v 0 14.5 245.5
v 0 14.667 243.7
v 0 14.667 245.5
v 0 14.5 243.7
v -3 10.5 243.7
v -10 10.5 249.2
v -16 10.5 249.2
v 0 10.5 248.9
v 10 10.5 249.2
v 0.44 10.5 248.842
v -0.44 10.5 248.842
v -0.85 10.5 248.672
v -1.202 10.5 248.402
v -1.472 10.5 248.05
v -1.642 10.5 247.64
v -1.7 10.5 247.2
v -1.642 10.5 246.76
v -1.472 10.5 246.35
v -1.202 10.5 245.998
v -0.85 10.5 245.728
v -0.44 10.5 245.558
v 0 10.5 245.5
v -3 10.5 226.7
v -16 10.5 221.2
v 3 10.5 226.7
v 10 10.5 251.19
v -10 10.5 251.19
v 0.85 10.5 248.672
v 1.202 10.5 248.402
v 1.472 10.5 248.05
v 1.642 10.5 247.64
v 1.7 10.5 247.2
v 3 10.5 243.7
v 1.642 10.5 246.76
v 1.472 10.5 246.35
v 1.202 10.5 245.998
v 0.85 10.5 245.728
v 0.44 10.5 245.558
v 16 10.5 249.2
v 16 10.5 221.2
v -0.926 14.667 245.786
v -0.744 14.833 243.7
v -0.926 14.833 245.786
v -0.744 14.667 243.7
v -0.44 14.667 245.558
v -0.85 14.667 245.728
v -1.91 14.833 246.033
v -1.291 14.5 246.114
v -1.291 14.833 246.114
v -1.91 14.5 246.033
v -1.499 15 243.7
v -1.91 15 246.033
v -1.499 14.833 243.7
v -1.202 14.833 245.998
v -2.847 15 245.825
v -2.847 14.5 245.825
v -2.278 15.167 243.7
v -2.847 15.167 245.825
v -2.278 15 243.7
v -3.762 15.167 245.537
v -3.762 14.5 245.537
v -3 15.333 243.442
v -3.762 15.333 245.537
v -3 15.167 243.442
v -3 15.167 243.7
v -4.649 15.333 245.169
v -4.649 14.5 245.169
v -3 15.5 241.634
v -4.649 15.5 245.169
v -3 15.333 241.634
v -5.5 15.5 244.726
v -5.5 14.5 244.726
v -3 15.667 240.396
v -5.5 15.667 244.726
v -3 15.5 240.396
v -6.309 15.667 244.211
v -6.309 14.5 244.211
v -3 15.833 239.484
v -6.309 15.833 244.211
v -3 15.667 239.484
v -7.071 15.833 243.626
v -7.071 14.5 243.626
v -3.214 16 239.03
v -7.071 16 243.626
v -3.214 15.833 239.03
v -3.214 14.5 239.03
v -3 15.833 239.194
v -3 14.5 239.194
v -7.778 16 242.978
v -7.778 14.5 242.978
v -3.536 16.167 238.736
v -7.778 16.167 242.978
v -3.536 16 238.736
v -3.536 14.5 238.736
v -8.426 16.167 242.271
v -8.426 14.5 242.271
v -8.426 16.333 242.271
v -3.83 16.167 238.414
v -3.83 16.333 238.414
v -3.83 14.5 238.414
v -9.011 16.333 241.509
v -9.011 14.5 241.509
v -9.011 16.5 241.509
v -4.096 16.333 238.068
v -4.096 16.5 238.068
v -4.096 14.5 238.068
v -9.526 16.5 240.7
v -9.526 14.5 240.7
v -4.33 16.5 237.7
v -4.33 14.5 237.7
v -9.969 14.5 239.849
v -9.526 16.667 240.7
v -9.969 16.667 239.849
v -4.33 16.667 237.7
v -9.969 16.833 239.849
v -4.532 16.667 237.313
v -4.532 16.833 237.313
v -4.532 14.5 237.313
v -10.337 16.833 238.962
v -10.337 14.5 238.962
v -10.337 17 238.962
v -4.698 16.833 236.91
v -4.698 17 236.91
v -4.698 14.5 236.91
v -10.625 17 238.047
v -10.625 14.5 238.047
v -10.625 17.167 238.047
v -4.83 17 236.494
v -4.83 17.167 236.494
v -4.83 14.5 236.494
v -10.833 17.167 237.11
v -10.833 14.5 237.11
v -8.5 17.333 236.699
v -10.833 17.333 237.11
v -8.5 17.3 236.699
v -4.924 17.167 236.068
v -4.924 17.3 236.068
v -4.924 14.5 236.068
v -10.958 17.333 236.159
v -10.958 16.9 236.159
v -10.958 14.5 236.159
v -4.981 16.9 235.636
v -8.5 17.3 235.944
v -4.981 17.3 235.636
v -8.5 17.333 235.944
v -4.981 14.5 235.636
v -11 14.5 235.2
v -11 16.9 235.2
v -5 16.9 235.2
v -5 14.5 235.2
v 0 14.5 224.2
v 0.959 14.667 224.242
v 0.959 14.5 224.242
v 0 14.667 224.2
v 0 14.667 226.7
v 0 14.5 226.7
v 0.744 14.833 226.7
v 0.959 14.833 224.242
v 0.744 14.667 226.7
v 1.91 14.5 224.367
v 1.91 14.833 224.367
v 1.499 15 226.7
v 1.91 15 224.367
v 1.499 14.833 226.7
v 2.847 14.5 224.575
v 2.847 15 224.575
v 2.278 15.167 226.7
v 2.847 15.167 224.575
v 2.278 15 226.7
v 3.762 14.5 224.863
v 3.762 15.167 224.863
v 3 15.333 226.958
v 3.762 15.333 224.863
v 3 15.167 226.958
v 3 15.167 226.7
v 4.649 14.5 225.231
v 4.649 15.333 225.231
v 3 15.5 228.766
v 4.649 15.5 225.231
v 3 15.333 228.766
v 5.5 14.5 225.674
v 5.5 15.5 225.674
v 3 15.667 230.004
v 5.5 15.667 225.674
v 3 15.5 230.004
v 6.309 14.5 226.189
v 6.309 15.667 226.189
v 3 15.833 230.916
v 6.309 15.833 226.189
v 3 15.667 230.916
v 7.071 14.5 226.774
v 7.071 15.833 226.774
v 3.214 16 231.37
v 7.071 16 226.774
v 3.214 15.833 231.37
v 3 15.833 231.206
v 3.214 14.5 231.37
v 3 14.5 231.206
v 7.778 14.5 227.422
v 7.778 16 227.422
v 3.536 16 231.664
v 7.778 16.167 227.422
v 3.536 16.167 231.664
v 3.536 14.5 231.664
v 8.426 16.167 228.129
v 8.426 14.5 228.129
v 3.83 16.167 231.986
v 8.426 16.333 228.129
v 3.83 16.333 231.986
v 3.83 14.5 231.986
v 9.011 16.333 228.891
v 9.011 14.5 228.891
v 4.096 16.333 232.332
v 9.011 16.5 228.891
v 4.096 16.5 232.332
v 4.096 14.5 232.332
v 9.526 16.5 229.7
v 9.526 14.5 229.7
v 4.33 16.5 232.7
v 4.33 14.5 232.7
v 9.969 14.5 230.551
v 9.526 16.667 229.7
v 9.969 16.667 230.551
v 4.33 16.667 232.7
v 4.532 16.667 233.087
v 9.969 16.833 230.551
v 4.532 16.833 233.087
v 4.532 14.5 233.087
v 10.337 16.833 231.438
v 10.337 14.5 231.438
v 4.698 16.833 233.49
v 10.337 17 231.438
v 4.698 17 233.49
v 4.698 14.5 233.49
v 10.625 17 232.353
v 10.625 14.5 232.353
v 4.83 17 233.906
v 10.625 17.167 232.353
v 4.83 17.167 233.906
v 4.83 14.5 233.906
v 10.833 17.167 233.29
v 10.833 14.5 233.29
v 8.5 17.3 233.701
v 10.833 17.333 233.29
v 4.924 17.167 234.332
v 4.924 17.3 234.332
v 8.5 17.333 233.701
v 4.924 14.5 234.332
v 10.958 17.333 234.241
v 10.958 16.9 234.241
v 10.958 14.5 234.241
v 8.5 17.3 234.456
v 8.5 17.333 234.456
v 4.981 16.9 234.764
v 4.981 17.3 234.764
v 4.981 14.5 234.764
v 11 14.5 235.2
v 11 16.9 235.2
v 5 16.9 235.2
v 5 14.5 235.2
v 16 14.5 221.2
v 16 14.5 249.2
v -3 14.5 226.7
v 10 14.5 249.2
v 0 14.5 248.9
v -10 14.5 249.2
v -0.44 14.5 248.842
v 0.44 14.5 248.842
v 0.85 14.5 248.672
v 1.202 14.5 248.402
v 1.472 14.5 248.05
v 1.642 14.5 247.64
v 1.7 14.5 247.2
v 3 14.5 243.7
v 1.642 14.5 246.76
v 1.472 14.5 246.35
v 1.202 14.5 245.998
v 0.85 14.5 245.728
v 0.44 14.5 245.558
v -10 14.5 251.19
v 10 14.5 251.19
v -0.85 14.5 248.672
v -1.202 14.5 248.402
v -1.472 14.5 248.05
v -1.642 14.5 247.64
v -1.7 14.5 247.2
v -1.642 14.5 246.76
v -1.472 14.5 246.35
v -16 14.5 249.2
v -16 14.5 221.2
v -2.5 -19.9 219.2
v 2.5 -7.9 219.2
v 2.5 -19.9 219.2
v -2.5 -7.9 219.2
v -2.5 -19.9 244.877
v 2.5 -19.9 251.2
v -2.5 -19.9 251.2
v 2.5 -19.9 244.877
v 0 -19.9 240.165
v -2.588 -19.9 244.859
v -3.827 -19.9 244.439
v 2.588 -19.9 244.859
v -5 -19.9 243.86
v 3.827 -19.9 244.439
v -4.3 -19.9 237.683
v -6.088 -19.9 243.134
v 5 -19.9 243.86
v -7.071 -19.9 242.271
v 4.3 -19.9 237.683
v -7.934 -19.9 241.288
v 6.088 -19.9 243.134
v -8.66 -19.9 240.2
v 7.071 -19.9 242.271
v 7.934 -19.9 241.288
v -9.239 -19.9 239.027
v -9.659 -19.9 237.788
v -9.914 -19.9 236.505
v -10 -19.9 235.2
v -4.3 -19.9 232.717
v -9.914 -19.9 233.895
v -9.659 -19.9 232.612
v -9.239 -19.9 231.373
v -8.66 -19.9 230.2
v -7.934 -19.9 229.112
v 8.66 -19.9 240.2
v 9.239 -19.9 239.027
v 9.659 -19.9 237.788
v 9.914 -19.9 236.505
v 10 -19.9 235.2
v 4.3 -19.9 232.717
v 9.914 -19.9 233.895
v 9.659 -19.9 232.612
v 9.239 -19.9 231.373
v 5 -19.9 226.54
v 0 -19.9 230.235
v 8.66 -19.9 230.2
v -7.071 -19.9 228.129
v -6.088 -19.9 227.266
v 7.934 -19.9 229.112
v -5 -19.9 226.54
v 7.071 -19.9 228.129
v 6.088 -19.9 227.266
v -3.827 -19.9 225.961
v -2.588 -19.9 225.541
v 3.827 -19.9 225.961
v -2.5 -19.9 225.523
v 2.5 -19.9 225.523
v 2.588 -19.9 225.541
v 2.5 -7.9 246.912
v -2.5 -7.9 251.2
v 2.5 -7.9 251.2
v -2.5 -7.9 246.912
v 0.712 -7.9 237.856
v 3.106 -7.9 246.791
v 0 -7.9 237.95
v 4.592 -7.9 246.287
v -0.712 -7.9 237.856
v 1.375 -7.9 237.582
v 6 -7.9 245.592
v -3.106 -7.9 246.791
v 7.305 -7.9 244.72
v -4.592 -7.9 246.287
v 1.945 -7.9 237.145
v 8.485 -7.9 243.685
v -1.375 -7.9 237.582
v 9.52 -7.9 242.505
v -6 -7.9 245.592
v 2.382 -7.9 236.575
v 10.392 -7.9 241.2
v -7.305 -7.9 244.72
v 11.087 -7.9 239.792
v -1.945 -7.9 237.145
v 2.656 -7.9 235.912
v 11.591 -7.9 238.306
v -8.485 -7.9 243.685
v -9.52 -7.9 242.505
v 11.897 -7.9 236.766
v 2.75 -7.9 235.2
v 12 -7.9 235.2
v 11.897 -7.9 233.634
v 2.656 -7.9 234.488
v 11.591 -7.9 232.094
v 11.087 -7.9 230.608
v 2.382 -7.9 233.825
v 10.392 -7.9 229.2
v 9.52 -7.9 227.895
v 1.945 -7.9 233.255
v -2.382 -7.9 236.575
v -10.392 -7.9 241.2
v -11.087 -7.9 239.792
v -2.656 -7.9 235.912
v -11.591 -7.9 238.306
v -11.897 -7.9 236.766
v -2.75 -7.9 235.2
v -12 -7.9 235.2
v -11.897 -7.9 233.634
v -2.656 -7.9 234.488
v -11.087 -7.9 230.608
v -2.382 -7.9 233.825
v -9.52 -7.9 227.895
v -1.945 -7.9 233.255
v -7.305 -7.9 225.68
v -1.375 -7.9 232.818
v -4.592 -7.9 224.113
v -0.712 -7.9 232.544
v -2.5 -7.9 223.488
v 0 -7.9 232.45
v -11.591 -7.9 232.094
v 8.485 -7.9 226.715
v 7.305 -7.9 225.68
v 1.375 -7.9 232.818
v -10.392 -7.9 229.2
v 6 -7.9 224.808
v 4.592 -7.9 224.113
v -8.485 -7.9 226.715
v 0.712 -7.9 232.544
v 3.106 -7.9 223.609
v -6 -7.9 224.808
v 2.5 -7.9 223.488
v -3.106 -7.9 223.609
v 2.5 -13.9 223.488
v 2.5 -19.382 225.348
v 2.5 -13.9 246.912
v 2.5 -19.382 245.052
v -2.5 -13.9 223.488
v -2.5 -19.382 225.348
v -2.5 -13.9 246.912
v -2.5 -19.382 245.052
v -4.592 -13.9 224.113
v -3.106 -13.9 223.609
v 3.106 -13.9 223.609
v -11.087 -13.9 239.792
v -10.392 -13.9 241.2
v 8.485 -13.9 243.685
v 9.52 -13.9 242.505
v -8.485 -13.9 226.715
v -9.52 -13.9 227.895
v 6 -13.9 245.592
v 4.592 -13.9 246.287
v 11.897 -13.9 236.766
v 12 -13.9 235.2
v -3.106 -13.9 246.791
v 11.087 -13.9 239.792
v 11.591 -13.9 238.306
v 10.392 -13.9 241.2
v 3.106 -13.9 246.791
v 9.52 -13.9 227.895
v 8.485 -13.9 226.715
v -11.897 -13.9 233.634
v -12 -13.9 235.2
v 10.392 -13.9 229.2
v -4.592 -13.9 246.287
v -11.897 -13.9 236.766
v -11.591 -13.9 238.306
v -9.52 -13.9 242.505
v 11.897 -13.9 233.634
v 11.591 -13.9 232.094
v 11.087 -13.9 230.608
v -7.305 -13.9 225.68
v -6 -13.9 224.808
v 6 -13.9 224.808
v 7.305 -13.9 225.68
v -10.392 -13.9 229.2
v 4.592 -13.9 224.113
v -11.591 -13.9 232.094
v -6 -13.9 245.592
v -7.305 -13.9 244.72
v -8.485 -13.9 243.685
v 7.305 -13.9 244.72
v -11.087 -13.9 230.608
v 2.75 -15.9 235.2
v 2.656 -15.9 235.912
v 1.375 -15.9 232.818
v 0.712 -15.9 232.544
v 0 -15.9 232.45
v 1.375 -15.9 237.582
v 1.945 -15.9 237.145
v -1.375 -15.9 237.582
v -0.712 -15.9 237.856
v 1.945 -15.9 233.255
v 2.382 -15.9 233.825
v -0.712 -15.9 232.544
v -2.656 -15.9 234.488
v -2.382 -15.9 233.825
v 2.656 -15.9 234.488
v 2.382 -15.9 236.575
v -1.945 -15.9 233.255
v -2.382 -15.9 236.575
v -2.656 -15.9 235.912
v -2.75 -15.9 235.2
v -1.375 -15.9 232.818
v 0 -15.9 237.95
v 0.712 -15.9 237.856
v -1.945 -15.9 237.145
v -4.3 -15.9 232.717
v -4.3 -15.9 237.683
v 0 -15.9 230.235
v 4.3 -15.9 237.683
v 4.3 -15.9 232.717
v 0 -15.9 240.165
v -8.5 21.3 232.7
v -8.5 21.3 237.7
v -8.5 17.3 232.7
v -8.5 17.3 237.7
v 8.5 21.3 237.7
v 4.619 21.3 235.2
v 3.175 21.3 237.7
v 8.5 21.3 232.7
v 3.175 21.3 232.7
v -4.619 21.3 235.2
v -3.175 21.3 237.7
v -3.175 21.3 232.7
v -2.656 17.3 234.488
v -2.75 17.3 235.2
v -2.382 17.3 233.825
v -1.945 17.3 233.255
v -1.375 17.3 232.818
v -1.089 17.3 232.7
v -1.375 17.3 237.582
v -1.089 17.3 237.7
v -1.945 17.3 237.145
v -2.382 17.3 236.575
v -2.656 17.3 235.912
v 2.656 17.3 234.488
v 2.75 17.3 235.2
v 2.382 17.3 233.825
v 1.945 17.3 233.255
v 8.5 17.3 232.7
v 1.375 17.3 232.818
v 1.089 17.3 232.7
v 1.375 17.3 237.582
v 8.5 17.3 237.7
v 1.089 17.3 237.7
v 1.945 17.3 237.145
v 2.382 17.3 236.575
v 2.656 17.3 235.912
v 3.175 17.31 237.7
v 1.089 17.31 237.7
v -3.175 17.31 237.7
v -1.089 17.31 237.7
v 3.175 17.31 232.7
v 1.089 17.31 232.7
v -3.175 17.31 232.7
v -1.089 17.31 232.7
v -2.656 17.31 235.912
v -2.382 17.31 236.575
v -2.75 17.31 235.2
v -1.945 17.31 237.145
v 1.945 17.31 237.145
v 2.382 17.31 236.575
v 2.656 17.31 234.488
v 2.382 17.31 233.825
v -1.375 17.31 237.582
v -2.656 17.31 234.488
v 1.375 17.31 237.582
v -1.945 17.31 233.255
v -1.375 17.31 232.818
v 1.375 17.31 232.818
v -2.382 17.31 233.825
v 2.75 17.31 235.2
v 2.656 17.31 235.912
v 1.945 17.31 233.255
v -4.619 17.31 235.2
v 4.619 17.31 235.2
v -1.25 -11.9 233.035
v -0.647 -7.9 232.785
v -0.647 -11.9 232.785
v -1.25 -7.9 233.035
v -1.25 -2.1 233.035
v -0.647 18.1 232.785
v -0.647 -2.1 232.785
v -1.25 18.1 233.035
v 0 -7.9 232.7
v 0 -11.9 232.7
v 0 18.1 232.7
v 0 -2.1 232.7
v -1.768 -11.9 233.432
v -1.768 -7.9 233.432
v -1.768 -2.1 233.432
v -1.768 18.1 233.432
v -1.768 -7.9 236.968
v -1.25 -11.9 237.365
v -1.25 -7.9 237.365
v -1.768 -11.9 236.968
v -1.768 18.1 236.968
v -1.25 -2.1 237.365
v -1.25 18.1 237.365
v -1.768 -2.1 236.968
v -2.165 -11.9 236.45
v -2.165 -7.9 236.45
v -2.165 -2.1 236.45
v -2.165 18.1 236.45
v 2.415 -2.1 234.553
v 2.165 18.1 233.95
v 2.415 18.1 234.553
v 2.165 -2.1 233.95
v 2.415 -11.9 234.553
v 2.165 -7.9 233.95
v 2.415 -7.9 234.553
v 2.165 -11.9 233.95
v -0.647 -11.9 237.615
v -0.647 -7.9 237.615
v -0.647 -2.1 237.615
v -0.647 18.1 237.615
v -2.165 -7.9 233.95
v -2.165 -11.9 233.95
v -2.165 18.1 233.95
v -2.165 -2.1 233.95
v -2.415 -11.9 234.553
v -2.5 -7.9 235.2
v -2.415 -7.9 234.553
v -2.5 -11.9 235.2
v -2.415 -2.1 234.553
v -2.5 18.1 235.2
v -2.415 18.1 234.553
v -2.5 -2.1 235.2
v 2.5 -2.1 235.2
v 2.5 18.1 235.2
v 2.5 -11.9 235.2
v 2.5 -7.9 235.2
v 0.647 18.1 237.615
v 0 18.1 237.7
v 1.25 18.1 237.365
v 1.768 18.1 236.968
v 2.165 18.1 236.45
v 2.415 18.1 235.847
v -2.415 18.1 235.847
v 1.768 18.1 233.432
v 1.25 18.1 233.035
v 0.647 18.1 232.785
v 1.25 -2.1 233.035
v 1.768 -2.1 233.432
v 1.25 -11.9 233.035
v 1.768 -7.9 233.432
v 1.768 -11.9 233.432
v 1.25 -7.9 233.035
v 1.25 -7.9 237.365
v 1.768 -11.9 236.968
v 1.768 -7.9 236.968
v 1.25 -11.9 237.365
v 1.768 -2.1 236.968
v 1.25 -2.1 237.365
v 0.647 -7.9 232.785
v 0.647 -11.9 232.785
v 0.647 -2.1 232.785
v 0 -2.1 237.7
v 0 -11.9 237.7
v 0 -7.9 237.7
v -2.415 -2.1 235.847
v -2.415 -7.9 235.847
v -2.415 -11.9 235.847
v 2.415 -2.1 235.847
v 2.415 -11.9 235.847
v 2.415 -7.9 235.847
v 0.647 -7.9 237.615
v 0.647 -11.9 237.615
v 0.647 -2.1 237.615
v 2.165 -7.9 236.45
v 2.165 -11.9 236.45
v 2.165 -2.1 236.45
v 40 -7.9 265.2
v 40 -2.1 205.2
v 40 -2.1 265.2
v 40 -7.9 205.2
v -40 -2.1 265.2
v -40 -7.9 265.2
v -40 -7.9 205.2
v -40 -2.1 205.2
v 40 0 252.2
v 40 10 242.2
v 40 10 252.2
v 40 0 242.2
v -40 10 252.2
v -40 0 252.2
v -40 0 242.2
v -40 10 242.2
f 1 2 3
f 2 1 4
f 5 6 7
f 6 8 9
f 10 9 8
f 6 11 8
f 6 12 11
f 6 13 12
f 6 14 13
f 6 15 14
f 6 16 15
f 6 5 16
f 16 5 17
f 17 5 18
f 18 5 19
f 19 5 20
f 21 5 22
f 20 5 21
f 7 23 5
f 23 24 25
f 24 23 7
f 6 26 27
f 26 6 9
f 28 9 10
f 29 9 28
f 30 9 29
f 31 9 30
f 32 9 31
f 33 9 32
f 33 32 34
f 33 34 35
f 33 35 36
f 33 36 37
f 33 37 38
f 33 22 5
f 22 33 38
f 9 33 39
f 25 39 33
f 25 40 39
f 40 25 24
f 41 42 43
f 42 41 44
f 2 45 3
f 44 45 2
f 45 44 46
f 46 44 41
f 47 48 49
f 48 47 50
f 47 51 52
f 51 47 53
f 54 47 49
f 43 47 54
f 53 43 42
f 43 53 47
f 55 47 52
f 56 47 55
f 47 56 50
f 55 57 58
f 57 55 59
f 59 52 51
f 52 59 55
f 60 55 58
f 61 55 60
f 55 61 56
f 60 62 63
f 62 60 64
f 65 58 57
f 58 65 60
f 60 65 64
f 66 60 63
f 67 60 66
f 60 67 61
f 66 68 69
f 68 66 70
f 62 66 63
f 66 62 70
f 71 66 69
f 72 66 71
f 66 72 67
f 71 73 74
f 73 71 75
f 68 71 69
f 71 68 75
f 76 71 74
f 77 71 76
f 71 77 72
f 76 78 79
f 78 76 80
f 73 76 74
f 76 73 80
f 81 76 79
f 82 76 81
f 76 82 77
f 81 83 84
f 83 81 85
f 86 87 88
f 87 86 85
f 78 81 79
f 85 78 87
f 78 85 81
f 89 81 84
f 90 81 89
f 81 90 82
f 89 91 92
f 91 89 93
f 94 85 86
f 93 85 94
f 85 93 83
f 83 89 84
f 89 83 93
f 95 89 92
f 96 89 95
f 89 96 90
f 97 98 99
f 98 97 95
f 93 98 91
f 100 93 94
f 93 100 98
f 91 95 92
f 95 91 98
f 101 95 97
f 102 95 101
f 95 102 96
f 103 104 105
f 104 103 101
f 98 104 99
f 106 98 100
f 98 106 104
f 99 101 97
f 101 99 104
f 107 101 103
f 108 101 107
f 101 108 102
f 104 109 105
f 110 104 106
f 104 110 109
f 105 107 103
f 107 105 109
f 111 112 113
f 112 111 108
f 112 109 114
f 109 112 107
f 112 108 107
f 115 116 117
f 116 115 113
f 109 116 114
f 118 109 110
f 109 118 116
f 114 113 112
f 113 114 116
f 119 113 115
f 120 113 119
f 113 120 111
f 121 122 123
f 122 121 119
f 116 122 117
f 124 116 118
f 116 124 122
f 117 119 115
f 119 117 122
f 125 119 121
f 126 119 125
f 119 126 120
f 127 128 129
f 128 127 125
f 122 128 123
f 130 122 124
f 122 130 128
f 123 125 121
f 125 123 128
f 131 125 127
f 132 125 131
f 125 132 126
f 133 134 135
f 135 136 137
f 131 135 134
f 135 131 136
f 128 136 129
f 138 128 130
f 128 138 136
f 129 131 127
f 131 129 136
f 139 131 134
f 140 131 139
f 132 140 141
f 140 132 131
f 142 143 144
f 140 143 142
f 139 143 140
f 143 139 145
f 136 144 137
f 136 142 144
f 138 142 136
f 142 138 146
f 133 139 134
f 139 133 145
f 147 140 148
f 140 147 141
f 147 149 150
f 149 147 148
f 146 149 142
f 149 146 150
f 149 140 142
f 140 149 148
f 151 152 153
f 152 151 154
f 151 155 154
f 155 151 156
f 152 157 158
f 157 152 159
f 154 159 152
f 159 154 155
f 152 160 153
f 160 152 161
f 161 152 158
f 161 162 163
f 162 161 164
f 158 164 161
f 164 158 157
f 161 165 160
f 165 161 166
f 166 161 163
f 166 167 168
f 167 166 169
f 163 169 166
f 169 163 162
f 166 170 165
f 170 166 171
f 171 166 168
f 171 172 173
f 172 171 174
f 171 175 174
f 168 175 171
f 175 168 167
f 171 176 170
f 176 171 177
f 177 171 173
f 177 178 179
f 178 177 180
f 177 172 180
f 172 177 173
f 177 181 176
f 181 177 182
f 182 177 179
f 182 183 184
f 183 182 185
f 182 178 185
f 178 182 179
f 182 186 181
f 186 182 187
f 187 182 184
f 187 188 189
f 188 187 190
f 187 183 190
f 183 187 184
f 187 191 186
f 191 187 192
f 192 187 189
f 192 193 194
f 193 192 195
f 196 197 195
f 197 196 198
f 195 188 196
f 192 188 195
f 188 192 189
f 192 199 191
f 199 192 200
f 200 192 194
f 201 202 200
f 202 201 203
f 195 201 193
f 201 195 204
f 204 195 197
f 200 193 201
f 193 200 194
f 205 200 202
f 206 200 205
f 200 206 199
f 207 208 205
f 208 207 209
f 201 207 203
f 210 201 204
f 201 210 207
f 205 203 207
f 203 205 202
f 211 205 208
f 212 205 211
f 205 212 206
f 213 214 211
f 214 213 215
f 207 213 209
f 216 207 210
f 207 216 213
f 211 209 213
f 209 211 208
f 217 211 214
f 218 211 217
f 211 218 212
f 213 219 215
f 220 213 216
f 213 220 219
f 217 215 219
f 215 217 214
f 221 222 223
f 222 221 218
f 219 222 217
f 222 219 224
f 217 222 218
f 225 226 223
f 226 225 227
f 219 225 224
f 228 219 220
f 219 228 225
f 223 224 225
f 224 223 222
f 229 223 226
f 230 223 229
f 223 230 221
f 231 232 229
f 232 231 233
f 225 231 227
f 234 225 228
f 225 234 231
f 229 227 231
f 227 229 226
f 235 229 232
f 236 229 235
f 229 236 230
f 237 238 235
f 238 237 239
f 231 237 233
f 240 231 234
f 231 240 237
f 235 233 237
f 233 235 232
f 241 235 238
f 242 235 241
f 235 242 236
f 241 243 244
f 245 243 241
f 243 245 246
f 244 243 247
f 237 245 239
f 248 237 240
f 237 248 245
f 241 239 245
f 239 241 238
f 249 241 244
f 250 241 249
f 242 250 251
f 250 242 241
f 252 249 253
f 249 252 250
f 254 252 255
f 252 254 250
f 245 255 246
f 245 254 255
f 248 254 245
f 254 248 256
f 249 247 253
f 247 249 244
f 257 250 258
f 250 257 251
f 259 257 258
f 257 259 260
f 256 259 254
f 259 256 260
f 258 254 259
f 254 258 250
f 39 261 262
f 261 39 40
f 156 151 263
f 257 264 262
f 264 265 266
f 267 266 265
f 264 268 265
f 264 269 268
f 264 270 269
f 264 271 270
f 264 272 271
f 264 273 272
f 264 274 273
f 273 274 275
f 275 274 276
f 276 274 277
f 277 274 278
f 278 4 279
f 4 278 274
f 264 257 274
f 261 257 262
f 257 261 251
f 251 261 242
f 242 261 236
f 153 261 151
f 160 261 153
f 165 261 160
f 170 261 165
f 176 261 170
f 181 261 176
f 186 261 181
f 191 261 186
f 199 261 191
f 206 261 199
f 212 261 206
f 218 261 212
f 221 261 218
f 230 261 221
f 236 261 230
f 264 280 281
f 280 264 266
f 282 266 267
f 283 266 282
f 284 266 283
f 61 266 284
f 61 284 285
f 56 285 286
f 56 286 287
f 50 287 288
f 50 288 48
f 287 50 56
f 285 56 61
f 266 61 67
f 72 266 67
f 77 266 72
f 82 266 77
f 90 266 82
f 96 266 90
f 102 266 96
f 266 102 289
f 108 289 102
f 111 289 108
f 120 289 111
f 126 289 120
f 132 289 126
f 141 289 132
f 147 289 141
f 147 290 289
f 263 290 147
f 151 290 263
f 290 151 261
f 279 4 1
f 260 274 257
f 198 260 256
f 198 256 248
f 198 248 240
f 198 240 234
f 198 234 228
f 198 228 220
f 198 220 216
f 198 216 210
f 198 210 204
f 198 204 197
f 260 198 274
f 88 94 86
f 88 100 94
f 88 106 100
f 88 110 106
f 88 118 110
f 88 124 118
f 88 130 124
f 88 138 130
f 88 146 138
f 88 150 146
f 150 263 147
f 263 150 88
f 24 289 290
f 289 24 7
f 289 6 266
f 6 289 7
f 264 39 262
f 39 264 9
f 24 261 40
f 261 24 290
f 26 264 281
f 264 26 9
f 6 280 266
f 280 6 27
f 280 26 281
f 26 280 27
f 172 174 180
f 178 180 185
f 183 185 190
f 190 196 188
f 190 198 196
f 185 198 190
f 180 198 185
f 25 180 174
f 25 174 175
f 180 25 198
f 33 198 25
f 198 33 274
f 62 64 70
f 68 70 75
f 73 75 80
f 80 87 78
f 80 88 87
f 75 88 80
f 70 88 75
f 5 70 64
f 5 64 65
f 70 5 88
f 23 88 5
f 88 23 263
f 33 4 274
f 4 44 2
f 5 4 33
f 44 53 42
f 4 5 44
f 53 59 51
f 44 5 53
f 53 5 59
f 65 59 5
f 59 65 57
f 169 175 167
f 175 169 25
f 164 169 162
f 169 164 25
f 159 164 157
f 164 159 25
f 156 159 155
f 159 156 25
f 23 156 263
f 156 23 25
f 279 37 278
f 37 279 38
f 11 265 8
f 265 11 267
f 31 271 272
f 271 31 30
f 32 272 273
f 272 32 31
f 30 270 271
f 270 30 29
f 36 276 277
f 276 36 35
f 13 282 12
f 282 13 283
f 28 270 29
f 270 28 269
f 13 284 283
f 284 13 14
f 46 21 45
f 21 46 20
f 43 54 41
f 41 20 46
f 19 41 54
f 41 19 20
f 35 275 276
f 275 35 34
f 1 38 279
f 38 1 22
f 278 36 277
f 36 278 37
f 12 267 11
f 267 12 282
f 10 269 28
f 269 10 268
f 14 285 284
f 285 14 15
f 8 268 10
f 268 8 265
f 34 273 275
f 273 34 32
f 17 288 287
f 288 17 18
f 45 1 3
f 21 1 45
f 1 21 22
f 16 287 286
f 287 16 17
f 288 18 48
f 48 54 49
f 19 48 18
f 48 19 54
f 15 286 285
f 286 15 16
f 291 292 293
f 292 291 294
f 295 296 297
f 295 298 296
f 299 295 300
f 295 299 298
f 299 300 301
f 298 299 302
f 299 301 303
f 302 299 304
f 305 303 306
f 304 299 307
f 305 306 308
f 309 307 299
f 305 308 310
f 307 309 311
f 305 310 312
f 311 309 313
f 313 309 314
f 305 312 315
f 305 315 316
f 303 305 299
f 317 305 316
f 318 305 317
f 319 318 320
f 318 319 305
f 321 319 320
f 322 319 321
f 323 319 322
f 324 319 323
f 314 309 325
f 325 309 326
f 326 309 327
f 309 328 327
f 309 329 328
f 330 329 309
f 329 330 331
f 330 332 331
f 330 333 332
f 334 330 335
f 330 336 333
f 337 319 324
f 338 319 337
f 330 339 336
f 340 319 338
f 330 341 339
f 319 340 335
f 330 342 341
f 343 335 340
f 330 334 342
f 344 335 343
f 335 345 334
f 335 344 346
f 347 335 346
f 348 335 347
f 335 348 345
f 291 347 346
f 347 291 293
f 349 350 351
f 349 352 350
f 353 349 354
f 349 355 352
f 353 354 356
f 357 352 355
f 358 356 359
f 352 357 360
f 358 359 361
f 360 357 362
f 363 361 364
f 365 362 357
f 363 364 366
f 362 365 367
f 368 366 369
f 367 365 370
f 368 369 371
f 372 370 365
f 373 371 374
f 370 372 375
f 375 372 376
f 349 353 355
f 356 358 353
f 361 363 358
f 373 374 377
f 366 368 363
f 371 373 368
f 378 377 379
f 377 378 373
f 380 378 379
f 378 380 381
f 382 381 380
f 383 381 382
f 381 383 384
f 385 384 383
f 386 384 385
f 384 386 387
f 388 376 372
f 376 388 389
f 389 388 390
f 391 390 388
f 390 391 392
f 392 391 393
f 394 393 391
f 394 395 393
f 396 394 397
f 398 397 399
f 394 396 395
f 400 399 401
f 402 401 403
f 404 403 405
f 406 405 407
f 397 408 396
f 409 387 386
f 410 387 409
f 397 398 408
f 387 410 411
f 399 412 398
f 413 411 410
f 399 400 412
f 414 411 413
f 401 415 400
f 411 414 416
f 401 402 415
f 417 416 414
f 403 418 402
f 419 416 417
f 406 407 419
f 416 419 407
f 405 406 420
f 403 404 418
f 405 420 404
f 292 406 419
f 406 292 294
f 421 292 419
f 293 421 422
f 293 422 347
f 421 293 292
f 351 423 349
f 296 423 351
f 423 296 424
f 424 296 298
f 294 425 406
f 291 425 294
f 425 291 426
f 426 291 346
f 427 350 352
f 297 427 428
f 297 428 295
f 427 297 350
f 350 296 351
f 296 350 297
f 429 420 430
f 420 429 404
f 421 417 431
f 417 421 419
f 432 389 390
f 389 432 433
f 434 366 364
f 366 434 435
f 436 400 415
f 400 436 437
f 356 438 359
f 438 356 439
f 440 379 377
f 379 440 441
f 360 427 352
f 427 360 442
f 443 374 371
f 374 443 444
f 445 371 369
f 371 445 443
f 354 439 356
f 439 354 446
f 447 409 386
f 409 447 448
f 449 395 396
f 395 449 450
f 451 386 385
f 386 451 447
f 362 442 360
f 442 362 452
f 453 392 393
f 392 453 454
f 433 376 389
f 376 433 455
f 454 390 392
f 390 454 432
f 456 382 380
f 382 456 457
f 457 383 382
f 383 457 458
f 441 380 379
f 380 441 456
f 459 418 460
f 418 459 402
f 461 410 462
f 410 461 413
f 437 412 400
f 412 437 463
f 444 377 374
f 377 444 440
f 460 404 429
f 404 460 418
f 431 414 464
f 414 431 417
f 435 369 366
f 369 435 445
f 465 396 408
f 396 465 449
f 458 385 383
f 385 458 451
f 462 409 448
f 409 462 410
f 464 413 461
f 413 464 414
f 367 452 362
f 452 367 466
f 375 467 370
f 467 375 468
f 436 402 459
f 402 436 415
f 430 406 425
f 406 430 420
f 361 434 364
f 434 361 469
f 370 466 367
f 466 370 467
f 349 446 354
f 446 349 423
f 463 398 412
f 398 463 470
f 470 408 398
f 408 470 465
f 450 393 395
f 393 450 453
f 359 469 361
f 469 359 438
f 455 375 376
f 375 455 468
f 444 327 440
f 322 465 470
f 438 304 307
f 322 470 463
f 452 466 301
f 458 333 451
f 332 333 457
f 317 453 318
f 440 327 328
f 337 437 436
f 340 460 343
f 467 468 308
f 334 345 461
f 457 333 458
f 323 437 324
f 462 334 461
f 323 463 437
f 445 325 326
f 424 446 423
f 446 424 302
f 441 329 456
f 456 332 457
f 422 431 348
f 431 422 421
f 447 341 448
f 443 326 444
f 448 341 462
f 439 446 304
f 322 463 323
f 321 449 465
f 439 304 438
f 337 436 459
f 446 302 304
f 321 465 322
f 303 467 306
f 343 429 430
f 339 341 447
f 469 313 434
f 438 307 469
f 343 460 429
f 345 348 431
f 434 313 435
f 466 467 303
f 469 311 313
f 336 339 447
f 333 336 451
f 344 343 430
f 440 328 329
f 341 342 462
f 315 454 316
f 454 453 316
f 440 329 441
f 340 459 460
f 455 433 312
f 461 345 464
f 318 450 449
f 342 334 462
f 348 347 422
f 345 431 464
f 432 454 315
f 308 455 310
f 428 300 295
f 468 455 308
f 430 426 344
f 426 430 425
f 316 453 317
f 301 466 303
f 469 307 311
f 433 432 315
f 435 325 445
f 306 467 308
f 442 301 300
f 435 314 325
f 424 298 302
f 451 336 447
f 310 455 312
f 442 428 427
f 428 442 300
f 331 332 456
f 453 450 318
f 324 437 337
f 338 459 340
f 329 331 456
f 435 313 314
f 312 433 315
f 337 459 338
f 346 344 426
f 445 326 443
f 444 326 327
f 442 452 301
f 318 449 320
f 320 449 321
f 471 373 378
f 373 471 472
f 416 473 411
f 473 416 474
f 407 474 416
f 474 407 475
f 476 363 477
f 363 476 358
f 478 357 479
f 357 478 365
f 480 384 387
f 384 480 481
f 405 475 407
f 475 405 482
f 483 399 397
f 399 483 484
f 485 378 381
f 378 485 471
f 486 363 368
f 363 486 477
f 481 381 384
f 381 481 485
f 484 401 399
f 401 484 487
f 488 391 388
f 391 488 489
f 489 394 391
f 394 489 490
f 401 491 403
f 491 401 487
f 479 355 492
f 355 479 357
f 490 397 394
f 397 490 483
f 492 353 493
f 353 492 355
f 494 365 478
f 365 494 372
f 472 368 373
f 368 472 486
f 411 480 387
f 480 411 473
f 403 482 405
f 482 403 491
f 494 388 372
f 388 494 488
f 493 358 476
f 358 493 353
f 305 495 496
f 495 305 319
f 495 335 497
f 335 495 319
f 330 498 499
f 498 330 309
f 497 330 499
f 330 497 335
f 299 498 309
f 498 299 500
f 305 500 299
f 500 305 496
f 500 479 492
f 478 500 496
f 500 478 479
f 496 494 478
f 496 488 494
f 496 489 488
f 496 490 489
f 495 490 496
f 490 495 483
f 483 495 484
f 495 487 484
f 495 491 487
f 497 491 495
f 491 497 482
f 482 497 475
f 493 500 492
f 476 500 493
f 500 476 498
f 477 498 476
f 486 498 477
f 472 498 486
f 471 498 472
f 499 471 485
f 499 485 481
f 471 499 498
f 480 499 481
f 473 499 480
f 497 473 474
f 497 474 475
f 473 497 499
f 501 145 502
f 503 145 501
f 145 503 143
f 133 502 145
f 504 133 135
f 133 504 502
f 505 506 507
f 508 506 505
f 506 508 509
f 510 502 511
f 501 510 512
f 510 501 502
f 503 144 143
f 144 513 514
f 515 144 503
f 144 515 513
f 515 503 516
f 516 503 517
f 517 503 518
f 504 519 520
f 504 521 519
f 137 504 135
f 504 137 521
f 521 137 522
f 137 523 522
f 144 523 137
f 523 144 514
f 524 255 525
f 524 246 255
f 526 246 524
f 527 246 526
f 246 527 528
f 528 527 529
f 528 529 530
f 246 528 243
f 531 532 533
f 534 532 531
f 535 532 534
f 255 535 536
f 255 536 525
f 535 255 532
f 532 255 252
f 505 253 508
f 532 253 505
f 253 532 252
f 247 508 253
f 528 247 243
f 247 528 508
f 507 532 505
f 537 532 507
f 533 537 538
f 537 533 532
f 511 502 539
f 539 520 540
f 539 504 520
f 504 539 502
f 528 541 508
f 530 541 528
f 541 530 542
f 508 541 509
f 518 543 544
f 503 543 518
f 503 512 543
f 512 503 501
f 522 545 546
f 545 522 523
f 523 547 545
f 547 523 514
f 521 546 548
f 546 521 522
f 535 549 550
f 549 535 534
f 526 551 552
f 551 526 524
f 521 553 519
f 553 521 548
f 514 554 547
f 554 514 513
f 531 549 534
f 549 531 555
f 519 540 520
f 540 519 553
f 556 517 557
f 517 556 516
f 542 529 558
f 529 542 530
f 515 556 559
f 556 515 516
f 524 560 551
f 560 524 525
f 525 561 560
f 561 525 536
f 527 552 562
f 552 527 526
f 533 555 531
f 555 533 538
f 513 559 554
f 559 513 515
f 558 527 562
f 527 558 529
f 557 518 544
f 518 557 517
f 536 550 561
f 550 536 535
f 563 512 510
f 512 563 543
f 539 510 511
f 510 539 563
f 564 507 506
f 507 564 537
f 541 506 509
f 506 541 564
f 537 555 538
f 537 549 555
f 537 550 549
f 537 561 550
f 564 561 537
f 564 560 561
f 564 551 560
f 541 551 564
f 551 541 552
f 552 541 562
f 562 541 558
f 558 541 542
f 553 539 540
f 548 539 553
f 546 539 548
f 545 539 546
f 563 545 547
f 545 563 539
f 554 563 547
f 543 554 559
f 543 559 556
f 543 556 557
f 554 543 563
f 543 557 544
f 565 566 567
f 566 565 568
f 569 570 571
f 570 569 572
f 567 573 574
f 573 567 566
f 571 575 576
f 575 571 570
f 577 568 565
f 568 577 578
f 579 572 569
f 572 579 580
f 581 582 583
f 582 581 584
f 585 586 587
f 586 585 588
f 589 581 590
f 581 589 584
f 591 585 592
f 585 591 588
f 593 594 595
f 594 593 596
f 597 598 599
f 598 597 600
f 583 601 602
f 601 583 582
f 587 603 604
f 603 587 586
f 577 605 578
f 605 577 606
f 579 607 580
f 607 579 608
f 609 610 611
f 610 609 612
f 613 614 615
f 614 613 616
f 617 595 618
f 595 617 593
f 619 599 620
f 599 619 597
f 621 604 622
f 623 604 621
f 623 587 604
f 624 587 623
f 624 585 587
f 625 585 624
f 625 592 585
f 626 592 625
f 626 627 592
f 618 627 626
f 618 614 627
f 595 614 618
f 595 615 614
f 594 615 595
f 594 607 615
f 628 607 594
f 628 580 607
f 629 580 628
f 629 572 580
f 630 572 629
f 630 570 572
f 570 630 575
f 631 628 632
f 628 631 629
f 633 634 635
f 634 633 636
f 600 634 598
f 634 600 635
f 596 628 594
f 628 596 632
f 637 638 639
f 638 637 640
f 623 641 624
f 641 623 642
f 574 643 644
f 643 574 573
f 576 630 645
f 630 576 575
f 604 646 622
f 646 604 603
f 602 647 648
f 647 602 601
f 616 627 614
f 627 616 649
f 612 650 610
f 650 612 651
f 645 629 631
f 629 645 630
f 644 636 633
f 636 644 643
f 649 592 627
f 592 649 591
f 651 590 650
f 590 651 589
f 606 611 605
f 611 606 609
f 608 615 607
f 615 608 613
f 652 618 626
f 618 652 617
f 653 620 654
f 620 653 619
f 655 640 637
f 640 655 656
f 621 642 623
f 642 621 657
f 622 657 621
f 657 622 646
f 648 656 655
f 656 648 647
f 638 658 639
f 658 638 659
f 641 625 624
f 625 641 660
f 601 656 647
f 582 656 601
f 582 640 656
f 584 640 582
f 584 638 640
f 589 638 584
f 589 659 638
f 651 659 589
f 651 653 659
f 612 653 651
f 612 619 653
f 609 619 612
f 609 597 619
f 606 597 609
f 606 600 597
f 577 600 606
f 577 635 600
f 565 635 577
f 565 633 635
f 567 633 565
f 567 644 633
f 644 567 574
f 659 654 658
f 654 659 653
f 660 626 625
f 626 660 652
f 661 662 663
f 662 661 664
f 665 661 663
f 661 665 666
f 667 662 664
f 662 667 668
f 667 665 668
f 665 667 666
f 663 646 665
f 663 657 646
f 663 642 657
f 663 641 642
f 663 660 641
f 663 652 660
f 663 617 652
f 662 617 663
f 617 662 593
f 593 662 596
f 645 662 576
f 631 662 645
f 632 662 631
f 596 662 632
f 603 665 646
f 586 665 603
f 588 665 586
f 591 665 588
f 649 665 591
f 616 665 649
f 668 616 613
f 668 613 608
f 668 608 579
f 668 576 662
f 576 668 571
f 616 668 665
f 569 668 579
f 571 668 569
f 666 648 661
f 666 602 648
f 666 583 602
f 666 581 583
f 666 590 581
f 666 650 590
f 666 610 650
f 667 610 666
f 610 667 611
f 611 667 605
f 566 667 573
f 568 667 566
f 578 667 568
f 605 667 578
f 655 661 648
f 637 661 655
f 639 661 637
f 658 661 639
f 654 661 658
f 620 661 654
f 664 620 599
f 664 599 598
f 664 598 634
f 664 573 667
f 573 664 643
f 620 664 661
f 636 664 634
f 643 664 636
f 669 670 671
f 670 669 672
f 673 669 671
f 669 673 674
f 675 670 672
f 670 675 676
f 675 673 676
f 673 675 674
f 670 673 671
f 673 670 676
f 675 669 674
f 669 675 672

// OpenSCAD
// 2026-11-03: quarter-turn door latch on an M5 bolt (concept, 2 per door, top edge).
// An M5 bolt turns freely in a 5.5 mm hole in the door. Outside: a printed knob on the bolt
// head. Inside: a printed T-bar on the bolt's tip (captive M5 nut, its position on the
// thread sets the squeeze). A printed receiver hangs from the back slot of the shell's top
// 1010 member: the bar passes through its slot with the knob vertical, and a quarter turn
// carries it up two helical ramps (ramp_rise over 90 deg) on the receiver's back face,
// pulling the door in; a shallow notch at the end of each ramp holds it locked.
// part = "assembly" | "knob" | "bar" | "receiver"; turn = 0 (open) .. 90 (locked).
// Axes as the box: y = 0 the shell front face, door inner face at y = -foam, z up. Units mm.

part = "assembly";
turn = 90;

t = 5.8; ext = 10; foam = 2.1;
mem_z   = [258 - t - ext, 258 - t];      // top frame member, 242.2 .. 252.2
bolt_z  = mem_z[0] - 7;                  // bolt axis, 7 below the opening's top edge
door_y  = -foam;

// receiver
rc_front = 10.5;  rc_t = 4;              // plate y = 10.5 .. 14.5, just behind the member
slot     = [6, 17];                      // across, along the bar (the bar enters vertical)
ramp_r   = [5, 11];                      // ramp annulus radii
ramp_rise = 3;                           // pull-in over the quarter turn
notch    = 0.6;

// bar
bar      = [17, 5, 4];                   // length, width, thickness (along y)
bar_y0   = rc_front + rc_t + ramp_rise - 0.2;   // bar front face when locked
nut_af = 8; nut_h = 4;

// ---------- parts ----------
module knob() {
    difference() {
        union() {
            cylinder(d = 24, h = 6, $fn = 48);
            translate([0, 0, 6]) cylinder(d1 = 24, d2 = 20, h = 6, $fn = 48);
            for (a = [0, 180]) rotate(a) translate([0, -2.5, 0]) cube([16, 5, 12]);   // wings
        }
        translate([0, 0, -1]) cylinder(d = 5.5, h = 20, $fn = 24);
        translate([0, 0, 8]) cylinder(d = 8.6 / cos(30), h = 5, $fn = 6);   // M5 hex head
    }
}

module bar() {
    difference() {
        translate([-bar[0] / 2, -bar[1] / 2, 0]) cube(bar);
        translate([0, 0, -1]) cylinder(d = 5.5, h = bar[2] + 2, $fn = 24);
        translate([0, 0, bar[2] - nut_h + 0.01]) cylinder(d = nut_af / cos(30), h = nut_h, $fn = 6);
    }
}

// receiver in its own frame: x across, local z = box y (from rc_front), local y = box z
// (0 = bolt axis); mount tab goes up behind the member to its back slot
module ramp() {   // one 90 deg helical ramp on the back face, rising ramp_rise, notch at the end
    for (i = [0 : 17]) {
        a0 = i * 5; a1 = a0 + 5;
        h = rc_t + ramp_rise * (i + 1) / 18 - (i == 17 ? notch : 0);
        rotate(a0) rotate_extrude(angle = 5, $fn = 72) translate([ramp_r[0], 0]) square([ramp_r[1] - ramp_r[0], h]);
    }
}
module receiver() {
    difference() {
        union() {
            translate([-16, -14, 0]) cube([32, 28, rc_t]);               // plate
            for (a = [0, 180]) rotate(a + 90) ramp();                    // two ramps, 180 apart
            translate([-10, 14 - 0.01, 0]) cube([20, mem_z[1] - bolt_z - 14 - 1, rc_t]);   // tab up
        }
        // bar slot (vertical) and bolt clearance
        translate([-slot[0] / 2, -slot[1] / 2, -1]) cube([slot[0], slot[1], 20]);
        // M3 into the member's back-slot T-nut
        translate([0, (mem_z[0] + mem_z[1]) / 2 - bolt_z, -1]) cylinder(d = 3.4, h = 20, $fn = 24);
    }
}

// ---------- assembly ----------
module assembly() {
    // door and top member, for context
    color([0.85, 0.92, 1.0, 0.5]) translate([-40, door_y - t, bolt_z - 30]) cube([80, t, 60]);
    color([0.75, 0.76, 0.78]) translate([-40, 0, mem_z[0]]) cube([80, ext, ext]);
    // receiver: hangs behind the member, its plate at y = rc_front .. rc_front + rc_t
    color([0.95, 0.55, 0.1]) translate([0, rc_front, bolt_z]) rotate([-90, 0, 0]) mirror([0, 1, 0]) receiver();
    // bolt, knob, bar
    translate([0, 0, bolt_z]) rotate([0, turn, 0]) {
        color("silver") translate([0, door_y - t - 4, 0]) rotate([-90, 0, 0]) cylinder(d = 5, h = 30, $fn = 24);
        color([0.15, 0.15, 0.17]) translate([0, door_y - t, 0]) rotate([90, 0, 0]) knob();
        color([0.2, 0.4, 0.8]) translate([0, bar_y0, 0]) rotate([-90, 0, 0]) rotate(90) bar();
    }
}

if (part == "knob") knob();
else if (part == "bar") bar();
else if (part == "receiver") receiver();
else assembly();
